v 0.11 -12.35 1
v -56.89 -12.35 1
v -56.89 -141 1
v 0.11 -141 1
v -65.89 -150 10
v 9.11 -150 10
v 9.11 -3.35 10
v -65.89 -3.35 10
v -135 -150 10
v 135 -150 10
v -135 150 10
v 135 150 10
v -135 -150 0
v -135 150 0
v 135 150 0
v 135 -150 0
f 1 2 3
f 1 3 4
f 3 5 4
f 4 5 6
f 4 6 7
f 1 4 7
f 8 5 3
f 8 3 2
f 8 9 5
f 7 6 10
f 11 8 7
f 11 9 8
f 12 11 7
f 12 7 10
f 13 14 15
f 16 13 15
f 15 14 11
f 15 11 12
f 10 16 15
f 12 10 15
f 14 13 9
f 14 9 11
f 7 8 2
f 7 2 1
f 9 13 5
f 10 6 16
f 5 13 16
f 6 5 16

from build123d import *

# Parameters (mm, degrees)
SKETCH1_W           = 270
SKETCH1_H           = 300
BOSS_EXTRUDE1_DEPTH = 10
SKETCH2_W           = 75
SKETCH2_H           = 146.65
CUT_EXTRUDE1_DEPTH  = 9
CUT_EXTRUDE1_DRAFT  = -45


with BuildPart() as part:
    # Sketch1 → Boss-Extrude1 (new body)
    with BuildSketch(Plane.XY):
        Rectangle(SKETCH1_W, SKETCH1_H)
    extrude(amount=BOSS_EXTRUDE1_DEPTH)


with BuildPart() as cut_extrude1_tool:
    # Sketch2 → Cut-Extrude1 (with draft: the straight prism first)
    with BuildSketch(Plane.XY.offset(10)):
        with Locations((-28.39, -76.675)):
            Rectangle(SKETCH2_W, SKETCH2_H)
    extrude(amount=-CUT_EXTRUDE1_DEPTH)
    # Cut-Extrude1: the draft: its side faces are tilted about the plane it starts from
    cut_extrude1_sides = [cut_extrude1_tool.faces().sort_by_distance(p)[0] for p in [
        (-28.39, -150, 5.5),
        (9.11, -76.675, 5.5),
        (-28.39, -3.35, 5.5),
        (-65.89, -76.675, 5.5),
    ]]
    draft(cut_extrude1_sides, Plane.XY.offset(10), CUT_EXTRUDE1_DRAFT)


with BuildPart() as part_1:
    add(part.part)

    # Cut-Extrude1: cut by cut_extrude1_tool
    add(cut_extrude1_tool.part, mode=Mode.SUBTRACT)


solid = part_1.part
